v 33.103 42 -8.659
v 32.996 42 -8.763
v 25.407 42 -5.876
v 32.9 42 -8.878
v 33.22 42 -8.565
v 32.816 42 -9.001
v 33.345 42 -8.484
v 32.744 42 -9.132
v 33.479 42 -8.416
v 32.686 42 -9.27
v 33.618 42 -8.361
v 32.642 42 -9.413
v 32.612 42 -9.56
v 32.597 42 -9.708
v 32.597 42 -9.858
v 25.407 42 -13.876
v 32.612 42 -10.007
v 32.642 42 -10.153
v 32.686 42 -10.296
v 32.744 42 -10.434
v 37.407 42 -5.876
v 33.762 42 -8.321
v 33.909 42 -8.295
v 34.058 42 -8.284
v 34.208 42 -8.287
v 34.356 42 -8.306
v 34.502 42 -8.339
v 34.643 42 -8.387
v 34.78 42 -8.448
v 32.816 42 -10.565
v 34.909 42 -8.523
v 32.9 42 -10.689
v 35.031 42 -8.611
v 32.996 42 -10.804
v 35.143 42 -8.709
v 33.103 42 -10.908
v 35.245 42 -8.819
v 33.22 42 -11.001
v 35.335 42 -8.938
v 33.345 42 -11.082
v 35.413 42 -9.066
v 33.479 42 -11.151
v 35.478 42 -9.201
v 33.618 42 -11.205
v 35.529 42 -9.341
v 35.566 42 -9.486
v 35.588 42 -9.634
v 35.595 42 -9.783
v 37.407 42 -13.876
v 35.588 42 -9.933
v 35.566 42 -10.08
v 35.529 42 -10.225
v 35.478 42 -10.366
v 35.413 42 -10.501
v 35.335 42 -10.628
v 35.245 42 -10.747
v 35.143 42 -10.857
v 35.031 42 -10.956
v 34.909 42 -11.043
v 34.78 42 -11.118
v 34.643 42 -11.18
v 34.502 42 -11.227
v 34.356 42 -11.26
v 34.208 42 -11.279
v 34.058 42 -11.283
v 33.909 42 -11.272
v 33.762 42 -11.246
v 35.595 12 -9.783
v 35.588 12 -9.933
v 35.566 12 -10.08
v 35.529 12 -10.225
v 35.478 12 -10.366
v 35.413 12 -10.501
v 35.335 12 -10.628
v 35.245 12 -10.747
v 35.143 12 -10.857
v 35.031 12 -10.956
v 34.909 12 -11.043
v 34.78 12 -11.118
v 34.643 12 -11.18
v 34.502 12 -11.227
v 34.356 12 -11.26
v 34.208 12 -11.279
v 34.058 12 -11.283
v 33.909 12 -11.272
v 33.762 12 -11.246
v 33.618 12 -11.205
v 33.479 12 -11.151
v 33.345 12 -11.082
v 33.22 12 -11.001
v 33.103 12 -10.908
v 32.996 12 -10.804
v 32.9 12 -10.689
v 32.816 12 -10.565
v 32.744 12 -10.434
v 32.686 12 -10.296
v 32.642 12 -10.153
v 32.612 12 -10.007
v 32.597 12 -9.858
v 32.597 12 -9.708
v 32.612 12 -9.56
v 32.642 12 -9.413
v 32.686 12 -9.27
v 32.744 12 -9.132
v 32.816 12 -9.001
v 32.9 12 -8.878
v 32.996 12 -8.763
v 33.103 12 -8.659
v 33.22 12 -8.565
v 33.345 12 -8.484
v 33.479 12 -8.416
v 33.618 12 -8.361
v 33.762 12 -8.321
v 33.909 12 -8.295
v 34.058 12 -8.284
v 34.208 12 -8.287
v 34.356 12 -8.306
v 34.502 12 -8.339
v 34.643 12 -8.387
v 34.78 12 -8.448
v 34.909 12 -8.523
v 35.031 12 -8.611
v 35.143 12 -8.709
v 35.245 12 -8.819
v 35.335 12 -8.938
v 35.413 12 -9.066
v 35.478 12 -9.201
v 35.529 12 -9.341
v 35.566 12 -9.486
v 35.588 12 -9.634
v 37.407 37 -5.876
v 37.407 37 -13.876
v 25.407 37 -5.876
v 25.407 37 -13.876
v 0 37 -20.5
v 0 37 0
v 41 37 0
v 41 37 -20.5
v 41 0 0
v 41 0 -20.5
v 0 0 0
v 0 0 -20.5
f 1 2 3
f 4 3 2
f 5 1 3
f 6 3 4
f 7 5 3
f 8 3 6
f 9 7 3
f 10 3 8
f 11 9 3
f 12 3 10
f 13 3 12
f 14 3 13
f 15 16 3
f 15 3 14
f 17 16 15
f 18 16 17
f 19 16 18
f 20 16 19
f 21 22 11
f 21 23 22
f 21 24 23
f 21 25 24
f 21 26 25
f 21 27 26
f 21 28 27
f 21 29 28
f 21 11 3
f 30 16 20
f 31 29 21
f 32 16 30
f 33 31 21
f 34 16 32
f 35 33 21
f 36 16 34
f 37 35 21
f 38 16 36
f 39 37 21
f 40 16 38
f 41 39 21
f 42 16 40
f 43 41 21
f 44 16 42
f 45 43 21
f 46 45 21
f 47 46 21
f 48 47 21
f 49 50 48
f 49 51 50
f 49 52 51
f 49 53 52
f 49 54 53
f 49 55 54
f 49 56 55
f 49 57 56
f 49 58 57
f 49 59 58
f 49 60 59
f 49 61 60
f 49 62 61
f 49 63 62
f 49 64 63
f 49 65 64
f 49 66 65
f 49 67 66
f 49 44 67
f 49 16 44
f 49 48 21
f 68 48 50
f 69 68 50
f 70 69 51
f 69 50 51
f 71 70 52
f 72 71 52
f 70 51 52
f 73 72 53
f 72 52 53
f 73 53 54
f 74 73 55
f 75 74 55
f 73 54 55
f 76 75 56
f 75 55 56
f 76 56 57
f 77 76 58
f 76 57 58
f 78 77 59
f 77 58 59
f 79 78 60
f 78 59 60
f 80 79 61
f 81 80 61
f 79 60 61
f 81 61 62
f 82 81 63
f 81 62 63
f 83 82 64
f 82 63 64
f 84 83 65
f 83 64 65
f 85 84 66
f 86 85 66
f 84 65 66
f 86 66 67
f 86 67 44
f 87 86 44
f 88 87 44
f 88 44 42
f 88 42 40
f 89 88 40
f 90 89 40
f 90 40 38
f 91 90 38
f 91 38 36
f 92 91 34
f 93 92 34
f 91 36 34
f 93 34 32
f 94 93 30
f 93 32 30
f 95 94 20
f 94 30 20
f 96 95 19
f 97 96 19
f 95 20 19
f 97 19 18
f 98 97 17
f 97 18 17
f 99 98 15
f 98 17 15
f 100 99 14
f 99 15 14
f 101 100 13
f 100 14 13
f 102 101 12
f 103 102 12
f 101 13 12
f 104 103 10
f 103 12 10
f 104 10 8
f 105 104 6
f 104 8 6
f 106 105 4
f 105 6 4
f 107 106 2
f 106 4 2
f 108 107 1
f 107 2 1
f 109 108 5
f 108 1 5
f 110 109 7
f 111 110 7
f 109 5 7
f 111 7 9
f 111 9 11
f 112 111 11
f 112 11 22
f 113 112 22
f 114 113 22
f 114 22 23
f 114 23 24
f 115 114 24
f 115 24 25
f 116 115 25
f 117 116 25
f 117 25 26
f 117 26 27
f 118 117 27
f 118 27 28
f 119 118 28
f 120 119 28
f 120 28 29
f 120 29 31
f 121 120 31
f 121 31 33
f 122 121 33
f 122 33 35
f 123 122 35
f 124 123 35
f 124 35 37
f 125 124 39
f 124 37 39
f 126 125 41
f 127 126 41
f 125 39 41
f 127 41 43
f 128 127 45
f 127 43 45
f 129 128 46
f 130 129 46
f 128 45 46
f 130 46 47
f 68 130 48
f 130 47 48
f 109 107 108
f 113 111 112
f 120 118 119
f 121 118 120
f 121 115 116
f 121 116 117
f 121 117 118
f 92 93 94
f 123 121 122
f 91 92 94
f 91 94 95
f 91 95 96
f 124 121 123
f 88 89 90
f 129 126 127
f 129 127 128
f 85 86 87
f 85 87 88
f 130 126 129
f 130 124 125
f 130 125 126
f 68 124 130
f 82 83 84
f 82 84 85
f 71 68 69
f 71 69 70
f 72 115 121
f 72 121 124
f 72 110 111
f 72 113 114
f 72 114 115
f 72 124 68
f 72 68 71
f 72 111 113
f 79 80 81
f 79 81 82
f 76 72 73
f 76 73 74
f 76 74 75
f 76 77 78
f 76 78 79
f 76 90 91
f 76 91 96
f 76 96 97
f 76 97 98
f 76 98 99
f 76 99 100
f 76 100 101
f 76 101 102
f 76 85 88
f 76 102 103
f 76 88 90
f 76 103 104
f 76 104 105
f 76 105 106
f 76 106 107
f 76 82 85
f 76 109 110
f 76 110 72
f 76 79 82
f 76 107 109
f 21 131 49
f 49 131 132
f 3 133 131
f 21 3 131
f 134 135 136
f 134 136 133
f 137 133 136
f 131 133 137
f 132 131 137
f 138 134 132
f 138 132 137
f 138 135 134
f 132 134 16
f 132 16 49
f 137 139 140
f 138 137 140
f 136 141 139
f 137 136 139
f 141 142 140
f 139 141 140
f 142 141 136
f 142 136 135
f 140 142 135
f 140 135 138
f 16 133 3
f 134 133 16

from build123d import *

# Parameters (mm, degrees)
SKETCH3_W           = 41
SKETCH3_H           = 20.5
BOSS_EXTRUDE1_DEPTH = 37
SKETCH5_W           = 12
SKETCH5_H           = 8
BOSS_EXTRUDE2_DEPTH = 5
SKETCH6_R           = 1.5
CUT_EXTRUDE1_DEPTH  = 30


with BuildPart() as part:
    # Sketch3 → Boss-Extrude1 (new body)
    with BuildSketch(Plane(origin=(0, 0, 0), x_dir=(1, 0, 0), z_dir=(0, 1, 0))):
        with Locations((20.5, 10.25)):
            Rectangle(SKETCH3_W, SKETCH3_H)
    extrude(amount=BOSS_EXTRUDE1_DEPTH)

    # Sketch5 → Boss-Extrude2 (add)
    with BuildSketch(Plane(origin=(0, 37, 0), x_dir=(1, 0, 0), z_dir=(0, 1, 0))):
        with Locations((31.406806077, 9.876249369)):
            Rectangle(SKETCH5_W, SKETCH5_H)
    extrude(amount=BOSS_EXTRUDE2_DEPTH)

    # Sketch6 → Cut-Extrude1 (cut)
    with BuildSketch(Plane(origin=(0, 42, 0), x_dir=(1, 0, 0), z_dir=(0, 1, 0))):
        with Locations((34.09544318, 9.783255032)):
            Circle(SKETCH6_R)
    extrude(amount=-CUT_EXTRUDE1_DEPTH, mode=Mode.SUBTRACT)


solid = part.part
